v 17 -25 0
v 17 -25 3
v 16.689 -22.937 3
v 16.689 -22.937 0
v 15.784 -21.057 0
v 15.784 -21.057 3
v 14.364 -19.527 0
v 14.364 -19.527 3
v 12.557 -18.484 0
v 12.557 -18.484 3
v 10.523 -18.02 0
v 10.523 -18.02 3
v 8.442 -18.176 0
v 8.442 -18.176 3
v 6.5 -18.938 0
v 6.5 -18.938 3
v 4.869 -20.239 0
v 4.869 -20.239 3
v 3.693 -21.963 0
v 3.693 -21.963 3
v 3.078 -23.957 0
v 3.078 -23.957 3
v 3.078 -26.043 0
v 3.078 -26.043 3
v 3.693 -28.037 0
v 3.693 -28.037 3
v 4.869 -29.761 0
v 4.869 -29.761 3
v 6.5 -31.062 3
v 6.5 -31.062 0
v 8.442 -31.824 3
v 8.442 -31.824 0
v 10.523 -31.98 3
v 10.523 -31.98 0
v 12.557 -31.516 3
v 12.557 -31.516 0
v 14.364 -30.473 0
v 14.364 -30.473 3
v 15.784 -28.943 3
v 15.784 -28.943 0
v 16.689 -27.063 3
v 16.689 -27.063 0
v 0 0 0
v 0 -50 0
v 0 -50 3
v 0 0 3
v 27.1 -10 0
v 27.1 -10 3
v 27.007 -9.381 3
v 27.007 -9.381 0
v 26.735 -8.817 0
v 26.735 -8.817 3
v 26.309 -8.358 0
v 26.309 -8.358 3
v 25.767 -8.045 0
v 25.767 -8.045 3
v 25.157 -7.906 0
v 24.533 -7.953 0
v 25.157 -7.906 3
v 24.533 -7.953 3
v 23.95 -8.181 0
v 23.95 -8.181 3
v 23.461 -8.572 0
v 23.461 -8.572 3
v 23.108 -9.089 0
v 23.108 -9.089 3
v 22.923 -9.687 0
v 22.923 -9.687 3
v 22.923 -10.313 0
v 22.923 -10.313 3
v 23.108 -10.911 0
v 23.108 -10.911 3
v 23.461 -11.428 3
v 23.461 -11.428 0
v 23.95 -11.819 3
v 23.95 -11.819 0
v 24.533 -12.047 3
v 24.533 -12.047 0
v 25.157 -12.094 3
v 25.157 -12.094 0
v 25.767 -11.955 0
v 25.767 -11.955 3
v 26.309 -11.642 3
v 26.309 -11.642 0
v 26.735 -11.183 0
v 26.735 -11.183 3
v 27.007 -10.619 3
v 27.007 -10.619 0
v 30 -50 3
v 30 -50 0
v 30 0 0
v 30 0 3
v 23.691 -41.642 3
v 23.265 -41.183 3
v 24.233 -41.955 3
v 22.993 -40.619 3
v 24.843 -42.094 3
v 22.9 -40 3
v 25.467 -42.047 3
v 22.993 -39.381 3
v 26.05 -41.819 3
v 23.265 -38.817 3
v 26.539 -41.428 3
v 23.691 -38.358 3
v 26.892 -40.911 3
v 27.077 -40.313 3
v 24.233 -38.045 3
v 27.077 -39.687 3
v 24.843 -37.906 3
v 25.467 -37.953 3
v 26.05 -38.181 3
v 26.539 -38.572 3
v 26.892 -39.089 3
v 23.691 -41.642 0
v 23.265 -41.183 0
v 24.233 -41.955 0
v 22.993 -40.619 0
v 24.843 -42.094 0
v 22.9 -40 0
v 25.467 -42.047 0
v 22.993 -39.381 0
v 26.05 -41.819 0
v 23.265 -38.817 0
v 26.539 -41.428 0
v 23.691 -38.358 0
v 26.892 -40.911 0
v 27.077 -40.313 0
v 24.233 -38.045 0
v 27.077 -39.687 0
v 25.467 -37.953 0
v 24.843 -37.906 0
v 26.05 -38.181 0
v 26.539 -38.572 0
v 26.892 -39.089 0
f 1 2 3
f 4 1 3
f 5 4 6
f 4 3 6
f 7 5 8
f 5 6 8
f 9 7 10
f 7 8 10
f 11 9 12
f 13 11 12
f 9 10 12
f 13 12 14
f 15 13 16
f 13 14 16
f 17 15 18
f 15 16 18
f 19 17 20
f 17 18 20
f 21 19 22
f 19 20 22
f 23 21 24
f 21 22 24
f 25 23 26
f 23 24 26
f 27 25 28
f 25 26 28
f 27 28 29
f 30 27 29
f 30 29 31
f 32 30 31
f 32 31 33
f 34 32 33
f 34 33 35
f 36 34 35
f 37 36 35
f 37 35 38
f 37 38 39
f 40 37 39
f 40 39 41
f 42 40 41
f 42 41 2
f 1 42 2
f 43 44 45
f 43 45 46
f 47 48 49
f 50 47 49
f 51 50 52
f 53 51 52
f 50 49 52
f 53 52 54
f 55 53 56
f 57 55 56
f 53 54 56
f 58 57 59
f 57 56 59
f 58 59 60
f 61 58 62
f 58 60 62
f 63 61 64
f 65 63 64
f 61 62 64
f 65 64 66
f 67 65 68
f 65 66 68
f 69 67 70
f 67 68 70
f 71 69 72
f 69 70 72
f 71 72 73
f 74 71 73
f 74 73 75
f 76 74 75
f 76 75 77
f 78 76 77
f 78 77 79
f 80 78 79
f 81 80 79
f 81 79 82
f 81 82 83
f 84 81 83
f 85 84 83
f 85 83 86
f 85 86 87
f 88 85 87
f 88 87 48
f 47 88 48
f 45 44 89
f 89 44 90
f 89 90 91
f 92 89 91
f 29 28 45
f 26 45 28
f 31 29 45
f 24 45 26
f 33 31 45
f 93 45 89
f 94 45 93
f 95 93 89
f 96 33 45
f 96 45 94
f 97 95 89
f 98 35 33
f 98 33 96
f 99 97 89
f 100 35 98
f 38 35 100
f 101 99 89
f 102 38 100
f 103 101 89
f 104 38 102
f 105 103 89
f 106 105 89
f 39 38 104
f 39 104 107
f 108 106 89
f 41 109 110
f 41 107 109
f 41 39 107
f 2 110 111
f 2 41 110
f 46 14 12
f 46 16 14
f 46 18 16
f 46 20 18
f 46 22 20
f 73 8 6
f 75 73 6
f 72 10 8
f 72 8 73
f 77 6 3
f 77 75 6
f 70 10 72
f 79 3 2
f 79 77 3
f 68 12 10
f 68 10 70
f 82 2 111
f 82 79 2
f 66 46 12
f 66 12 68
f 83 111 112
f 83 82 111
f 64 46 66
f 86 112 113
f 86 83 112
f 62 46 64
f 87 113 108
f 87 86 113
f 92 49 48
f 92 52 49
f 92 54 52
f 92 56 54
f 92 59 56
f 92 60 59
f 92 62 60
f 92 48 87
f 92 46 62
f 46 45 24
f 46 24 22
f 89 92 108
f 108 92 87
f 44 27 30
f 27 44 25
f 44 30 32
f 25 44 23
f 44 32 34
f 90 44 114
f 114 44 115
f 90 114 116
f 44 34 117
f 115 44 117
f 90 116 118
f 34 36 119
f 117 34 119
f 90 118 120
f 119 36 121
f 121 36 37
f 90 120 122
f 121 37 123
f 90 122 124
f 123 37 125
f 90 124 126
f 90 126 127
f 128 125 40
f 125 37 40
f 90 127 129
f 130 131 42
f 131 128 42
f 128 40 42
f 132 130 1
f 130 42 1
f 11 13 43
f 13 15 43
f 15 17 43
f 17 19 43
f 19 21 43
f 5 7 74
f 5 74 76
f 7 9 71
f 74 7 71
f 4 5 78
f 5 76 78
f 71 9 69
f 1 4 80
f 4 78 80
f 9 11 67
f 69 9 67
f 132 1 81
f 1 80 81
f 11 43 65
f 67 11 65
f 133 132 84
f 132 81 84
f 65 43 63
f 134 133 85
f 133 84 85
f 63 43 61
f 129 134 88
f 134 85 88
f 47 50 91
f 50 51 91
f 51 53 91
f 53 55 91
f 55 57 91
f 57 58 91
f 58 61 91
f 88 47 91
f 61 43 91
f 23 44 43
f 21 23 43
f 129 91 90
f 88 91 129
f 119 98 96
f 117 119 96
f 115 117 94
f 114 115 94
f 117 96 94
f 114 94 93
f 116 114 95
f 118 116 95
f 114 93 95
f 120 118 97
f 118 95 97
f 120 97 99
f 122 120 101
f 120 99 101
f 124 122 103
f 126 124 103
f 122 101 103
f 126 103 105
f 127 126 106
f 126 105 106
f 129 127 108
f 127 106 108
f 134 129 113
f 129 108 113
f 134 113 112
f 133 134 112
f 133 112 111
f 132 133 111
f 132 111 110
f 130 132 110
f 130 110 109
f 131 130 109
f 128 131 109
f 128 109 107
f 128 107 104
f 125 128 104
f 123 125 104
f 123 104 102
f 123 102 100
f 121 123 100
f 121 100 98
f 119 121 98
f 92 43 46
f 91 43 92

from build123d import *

# Parameters (mm, degrees)
SKETCH_1_W          = 30
SKETCH_1_H          = 50
EXTRUDE_1_DEPTH     = 3
SKETCH_2_R          = 7
SKETCH_2_R_2        = 2.1
CUT_EXTRUDE_1_DEPTH = 59.386642308


with BuildPart() as part:
    # 草图1 → 凸台-拉伸1 (new body)
    with BuildSketch(Plane.XY):
        with Locations((15, -25)):
            Rectangle(SKETCH_1_W, SKETCH_1_H)
    extrude(amount=EXTRUDE_1_DEPTH)

    # 草图2 → 切除-拉伸1 (cut, through all)
    with BuildSketch(Plane.XY.offset(3)):
        with Locations((10, -25)):
            Circle(SKETCH_2_R)
        with Locations((25, -10)):
            Circle(SKETCH_2_R_2)
        with Locations(Location((25, -40, 0), (0, 0, 180))):
            Circle(SKETCH_2_R_2)
    extrude(amount=-CUT_EXTRUDE_1_DEPTH, mode=Mode.SUBTRACT)


solid = part.part
